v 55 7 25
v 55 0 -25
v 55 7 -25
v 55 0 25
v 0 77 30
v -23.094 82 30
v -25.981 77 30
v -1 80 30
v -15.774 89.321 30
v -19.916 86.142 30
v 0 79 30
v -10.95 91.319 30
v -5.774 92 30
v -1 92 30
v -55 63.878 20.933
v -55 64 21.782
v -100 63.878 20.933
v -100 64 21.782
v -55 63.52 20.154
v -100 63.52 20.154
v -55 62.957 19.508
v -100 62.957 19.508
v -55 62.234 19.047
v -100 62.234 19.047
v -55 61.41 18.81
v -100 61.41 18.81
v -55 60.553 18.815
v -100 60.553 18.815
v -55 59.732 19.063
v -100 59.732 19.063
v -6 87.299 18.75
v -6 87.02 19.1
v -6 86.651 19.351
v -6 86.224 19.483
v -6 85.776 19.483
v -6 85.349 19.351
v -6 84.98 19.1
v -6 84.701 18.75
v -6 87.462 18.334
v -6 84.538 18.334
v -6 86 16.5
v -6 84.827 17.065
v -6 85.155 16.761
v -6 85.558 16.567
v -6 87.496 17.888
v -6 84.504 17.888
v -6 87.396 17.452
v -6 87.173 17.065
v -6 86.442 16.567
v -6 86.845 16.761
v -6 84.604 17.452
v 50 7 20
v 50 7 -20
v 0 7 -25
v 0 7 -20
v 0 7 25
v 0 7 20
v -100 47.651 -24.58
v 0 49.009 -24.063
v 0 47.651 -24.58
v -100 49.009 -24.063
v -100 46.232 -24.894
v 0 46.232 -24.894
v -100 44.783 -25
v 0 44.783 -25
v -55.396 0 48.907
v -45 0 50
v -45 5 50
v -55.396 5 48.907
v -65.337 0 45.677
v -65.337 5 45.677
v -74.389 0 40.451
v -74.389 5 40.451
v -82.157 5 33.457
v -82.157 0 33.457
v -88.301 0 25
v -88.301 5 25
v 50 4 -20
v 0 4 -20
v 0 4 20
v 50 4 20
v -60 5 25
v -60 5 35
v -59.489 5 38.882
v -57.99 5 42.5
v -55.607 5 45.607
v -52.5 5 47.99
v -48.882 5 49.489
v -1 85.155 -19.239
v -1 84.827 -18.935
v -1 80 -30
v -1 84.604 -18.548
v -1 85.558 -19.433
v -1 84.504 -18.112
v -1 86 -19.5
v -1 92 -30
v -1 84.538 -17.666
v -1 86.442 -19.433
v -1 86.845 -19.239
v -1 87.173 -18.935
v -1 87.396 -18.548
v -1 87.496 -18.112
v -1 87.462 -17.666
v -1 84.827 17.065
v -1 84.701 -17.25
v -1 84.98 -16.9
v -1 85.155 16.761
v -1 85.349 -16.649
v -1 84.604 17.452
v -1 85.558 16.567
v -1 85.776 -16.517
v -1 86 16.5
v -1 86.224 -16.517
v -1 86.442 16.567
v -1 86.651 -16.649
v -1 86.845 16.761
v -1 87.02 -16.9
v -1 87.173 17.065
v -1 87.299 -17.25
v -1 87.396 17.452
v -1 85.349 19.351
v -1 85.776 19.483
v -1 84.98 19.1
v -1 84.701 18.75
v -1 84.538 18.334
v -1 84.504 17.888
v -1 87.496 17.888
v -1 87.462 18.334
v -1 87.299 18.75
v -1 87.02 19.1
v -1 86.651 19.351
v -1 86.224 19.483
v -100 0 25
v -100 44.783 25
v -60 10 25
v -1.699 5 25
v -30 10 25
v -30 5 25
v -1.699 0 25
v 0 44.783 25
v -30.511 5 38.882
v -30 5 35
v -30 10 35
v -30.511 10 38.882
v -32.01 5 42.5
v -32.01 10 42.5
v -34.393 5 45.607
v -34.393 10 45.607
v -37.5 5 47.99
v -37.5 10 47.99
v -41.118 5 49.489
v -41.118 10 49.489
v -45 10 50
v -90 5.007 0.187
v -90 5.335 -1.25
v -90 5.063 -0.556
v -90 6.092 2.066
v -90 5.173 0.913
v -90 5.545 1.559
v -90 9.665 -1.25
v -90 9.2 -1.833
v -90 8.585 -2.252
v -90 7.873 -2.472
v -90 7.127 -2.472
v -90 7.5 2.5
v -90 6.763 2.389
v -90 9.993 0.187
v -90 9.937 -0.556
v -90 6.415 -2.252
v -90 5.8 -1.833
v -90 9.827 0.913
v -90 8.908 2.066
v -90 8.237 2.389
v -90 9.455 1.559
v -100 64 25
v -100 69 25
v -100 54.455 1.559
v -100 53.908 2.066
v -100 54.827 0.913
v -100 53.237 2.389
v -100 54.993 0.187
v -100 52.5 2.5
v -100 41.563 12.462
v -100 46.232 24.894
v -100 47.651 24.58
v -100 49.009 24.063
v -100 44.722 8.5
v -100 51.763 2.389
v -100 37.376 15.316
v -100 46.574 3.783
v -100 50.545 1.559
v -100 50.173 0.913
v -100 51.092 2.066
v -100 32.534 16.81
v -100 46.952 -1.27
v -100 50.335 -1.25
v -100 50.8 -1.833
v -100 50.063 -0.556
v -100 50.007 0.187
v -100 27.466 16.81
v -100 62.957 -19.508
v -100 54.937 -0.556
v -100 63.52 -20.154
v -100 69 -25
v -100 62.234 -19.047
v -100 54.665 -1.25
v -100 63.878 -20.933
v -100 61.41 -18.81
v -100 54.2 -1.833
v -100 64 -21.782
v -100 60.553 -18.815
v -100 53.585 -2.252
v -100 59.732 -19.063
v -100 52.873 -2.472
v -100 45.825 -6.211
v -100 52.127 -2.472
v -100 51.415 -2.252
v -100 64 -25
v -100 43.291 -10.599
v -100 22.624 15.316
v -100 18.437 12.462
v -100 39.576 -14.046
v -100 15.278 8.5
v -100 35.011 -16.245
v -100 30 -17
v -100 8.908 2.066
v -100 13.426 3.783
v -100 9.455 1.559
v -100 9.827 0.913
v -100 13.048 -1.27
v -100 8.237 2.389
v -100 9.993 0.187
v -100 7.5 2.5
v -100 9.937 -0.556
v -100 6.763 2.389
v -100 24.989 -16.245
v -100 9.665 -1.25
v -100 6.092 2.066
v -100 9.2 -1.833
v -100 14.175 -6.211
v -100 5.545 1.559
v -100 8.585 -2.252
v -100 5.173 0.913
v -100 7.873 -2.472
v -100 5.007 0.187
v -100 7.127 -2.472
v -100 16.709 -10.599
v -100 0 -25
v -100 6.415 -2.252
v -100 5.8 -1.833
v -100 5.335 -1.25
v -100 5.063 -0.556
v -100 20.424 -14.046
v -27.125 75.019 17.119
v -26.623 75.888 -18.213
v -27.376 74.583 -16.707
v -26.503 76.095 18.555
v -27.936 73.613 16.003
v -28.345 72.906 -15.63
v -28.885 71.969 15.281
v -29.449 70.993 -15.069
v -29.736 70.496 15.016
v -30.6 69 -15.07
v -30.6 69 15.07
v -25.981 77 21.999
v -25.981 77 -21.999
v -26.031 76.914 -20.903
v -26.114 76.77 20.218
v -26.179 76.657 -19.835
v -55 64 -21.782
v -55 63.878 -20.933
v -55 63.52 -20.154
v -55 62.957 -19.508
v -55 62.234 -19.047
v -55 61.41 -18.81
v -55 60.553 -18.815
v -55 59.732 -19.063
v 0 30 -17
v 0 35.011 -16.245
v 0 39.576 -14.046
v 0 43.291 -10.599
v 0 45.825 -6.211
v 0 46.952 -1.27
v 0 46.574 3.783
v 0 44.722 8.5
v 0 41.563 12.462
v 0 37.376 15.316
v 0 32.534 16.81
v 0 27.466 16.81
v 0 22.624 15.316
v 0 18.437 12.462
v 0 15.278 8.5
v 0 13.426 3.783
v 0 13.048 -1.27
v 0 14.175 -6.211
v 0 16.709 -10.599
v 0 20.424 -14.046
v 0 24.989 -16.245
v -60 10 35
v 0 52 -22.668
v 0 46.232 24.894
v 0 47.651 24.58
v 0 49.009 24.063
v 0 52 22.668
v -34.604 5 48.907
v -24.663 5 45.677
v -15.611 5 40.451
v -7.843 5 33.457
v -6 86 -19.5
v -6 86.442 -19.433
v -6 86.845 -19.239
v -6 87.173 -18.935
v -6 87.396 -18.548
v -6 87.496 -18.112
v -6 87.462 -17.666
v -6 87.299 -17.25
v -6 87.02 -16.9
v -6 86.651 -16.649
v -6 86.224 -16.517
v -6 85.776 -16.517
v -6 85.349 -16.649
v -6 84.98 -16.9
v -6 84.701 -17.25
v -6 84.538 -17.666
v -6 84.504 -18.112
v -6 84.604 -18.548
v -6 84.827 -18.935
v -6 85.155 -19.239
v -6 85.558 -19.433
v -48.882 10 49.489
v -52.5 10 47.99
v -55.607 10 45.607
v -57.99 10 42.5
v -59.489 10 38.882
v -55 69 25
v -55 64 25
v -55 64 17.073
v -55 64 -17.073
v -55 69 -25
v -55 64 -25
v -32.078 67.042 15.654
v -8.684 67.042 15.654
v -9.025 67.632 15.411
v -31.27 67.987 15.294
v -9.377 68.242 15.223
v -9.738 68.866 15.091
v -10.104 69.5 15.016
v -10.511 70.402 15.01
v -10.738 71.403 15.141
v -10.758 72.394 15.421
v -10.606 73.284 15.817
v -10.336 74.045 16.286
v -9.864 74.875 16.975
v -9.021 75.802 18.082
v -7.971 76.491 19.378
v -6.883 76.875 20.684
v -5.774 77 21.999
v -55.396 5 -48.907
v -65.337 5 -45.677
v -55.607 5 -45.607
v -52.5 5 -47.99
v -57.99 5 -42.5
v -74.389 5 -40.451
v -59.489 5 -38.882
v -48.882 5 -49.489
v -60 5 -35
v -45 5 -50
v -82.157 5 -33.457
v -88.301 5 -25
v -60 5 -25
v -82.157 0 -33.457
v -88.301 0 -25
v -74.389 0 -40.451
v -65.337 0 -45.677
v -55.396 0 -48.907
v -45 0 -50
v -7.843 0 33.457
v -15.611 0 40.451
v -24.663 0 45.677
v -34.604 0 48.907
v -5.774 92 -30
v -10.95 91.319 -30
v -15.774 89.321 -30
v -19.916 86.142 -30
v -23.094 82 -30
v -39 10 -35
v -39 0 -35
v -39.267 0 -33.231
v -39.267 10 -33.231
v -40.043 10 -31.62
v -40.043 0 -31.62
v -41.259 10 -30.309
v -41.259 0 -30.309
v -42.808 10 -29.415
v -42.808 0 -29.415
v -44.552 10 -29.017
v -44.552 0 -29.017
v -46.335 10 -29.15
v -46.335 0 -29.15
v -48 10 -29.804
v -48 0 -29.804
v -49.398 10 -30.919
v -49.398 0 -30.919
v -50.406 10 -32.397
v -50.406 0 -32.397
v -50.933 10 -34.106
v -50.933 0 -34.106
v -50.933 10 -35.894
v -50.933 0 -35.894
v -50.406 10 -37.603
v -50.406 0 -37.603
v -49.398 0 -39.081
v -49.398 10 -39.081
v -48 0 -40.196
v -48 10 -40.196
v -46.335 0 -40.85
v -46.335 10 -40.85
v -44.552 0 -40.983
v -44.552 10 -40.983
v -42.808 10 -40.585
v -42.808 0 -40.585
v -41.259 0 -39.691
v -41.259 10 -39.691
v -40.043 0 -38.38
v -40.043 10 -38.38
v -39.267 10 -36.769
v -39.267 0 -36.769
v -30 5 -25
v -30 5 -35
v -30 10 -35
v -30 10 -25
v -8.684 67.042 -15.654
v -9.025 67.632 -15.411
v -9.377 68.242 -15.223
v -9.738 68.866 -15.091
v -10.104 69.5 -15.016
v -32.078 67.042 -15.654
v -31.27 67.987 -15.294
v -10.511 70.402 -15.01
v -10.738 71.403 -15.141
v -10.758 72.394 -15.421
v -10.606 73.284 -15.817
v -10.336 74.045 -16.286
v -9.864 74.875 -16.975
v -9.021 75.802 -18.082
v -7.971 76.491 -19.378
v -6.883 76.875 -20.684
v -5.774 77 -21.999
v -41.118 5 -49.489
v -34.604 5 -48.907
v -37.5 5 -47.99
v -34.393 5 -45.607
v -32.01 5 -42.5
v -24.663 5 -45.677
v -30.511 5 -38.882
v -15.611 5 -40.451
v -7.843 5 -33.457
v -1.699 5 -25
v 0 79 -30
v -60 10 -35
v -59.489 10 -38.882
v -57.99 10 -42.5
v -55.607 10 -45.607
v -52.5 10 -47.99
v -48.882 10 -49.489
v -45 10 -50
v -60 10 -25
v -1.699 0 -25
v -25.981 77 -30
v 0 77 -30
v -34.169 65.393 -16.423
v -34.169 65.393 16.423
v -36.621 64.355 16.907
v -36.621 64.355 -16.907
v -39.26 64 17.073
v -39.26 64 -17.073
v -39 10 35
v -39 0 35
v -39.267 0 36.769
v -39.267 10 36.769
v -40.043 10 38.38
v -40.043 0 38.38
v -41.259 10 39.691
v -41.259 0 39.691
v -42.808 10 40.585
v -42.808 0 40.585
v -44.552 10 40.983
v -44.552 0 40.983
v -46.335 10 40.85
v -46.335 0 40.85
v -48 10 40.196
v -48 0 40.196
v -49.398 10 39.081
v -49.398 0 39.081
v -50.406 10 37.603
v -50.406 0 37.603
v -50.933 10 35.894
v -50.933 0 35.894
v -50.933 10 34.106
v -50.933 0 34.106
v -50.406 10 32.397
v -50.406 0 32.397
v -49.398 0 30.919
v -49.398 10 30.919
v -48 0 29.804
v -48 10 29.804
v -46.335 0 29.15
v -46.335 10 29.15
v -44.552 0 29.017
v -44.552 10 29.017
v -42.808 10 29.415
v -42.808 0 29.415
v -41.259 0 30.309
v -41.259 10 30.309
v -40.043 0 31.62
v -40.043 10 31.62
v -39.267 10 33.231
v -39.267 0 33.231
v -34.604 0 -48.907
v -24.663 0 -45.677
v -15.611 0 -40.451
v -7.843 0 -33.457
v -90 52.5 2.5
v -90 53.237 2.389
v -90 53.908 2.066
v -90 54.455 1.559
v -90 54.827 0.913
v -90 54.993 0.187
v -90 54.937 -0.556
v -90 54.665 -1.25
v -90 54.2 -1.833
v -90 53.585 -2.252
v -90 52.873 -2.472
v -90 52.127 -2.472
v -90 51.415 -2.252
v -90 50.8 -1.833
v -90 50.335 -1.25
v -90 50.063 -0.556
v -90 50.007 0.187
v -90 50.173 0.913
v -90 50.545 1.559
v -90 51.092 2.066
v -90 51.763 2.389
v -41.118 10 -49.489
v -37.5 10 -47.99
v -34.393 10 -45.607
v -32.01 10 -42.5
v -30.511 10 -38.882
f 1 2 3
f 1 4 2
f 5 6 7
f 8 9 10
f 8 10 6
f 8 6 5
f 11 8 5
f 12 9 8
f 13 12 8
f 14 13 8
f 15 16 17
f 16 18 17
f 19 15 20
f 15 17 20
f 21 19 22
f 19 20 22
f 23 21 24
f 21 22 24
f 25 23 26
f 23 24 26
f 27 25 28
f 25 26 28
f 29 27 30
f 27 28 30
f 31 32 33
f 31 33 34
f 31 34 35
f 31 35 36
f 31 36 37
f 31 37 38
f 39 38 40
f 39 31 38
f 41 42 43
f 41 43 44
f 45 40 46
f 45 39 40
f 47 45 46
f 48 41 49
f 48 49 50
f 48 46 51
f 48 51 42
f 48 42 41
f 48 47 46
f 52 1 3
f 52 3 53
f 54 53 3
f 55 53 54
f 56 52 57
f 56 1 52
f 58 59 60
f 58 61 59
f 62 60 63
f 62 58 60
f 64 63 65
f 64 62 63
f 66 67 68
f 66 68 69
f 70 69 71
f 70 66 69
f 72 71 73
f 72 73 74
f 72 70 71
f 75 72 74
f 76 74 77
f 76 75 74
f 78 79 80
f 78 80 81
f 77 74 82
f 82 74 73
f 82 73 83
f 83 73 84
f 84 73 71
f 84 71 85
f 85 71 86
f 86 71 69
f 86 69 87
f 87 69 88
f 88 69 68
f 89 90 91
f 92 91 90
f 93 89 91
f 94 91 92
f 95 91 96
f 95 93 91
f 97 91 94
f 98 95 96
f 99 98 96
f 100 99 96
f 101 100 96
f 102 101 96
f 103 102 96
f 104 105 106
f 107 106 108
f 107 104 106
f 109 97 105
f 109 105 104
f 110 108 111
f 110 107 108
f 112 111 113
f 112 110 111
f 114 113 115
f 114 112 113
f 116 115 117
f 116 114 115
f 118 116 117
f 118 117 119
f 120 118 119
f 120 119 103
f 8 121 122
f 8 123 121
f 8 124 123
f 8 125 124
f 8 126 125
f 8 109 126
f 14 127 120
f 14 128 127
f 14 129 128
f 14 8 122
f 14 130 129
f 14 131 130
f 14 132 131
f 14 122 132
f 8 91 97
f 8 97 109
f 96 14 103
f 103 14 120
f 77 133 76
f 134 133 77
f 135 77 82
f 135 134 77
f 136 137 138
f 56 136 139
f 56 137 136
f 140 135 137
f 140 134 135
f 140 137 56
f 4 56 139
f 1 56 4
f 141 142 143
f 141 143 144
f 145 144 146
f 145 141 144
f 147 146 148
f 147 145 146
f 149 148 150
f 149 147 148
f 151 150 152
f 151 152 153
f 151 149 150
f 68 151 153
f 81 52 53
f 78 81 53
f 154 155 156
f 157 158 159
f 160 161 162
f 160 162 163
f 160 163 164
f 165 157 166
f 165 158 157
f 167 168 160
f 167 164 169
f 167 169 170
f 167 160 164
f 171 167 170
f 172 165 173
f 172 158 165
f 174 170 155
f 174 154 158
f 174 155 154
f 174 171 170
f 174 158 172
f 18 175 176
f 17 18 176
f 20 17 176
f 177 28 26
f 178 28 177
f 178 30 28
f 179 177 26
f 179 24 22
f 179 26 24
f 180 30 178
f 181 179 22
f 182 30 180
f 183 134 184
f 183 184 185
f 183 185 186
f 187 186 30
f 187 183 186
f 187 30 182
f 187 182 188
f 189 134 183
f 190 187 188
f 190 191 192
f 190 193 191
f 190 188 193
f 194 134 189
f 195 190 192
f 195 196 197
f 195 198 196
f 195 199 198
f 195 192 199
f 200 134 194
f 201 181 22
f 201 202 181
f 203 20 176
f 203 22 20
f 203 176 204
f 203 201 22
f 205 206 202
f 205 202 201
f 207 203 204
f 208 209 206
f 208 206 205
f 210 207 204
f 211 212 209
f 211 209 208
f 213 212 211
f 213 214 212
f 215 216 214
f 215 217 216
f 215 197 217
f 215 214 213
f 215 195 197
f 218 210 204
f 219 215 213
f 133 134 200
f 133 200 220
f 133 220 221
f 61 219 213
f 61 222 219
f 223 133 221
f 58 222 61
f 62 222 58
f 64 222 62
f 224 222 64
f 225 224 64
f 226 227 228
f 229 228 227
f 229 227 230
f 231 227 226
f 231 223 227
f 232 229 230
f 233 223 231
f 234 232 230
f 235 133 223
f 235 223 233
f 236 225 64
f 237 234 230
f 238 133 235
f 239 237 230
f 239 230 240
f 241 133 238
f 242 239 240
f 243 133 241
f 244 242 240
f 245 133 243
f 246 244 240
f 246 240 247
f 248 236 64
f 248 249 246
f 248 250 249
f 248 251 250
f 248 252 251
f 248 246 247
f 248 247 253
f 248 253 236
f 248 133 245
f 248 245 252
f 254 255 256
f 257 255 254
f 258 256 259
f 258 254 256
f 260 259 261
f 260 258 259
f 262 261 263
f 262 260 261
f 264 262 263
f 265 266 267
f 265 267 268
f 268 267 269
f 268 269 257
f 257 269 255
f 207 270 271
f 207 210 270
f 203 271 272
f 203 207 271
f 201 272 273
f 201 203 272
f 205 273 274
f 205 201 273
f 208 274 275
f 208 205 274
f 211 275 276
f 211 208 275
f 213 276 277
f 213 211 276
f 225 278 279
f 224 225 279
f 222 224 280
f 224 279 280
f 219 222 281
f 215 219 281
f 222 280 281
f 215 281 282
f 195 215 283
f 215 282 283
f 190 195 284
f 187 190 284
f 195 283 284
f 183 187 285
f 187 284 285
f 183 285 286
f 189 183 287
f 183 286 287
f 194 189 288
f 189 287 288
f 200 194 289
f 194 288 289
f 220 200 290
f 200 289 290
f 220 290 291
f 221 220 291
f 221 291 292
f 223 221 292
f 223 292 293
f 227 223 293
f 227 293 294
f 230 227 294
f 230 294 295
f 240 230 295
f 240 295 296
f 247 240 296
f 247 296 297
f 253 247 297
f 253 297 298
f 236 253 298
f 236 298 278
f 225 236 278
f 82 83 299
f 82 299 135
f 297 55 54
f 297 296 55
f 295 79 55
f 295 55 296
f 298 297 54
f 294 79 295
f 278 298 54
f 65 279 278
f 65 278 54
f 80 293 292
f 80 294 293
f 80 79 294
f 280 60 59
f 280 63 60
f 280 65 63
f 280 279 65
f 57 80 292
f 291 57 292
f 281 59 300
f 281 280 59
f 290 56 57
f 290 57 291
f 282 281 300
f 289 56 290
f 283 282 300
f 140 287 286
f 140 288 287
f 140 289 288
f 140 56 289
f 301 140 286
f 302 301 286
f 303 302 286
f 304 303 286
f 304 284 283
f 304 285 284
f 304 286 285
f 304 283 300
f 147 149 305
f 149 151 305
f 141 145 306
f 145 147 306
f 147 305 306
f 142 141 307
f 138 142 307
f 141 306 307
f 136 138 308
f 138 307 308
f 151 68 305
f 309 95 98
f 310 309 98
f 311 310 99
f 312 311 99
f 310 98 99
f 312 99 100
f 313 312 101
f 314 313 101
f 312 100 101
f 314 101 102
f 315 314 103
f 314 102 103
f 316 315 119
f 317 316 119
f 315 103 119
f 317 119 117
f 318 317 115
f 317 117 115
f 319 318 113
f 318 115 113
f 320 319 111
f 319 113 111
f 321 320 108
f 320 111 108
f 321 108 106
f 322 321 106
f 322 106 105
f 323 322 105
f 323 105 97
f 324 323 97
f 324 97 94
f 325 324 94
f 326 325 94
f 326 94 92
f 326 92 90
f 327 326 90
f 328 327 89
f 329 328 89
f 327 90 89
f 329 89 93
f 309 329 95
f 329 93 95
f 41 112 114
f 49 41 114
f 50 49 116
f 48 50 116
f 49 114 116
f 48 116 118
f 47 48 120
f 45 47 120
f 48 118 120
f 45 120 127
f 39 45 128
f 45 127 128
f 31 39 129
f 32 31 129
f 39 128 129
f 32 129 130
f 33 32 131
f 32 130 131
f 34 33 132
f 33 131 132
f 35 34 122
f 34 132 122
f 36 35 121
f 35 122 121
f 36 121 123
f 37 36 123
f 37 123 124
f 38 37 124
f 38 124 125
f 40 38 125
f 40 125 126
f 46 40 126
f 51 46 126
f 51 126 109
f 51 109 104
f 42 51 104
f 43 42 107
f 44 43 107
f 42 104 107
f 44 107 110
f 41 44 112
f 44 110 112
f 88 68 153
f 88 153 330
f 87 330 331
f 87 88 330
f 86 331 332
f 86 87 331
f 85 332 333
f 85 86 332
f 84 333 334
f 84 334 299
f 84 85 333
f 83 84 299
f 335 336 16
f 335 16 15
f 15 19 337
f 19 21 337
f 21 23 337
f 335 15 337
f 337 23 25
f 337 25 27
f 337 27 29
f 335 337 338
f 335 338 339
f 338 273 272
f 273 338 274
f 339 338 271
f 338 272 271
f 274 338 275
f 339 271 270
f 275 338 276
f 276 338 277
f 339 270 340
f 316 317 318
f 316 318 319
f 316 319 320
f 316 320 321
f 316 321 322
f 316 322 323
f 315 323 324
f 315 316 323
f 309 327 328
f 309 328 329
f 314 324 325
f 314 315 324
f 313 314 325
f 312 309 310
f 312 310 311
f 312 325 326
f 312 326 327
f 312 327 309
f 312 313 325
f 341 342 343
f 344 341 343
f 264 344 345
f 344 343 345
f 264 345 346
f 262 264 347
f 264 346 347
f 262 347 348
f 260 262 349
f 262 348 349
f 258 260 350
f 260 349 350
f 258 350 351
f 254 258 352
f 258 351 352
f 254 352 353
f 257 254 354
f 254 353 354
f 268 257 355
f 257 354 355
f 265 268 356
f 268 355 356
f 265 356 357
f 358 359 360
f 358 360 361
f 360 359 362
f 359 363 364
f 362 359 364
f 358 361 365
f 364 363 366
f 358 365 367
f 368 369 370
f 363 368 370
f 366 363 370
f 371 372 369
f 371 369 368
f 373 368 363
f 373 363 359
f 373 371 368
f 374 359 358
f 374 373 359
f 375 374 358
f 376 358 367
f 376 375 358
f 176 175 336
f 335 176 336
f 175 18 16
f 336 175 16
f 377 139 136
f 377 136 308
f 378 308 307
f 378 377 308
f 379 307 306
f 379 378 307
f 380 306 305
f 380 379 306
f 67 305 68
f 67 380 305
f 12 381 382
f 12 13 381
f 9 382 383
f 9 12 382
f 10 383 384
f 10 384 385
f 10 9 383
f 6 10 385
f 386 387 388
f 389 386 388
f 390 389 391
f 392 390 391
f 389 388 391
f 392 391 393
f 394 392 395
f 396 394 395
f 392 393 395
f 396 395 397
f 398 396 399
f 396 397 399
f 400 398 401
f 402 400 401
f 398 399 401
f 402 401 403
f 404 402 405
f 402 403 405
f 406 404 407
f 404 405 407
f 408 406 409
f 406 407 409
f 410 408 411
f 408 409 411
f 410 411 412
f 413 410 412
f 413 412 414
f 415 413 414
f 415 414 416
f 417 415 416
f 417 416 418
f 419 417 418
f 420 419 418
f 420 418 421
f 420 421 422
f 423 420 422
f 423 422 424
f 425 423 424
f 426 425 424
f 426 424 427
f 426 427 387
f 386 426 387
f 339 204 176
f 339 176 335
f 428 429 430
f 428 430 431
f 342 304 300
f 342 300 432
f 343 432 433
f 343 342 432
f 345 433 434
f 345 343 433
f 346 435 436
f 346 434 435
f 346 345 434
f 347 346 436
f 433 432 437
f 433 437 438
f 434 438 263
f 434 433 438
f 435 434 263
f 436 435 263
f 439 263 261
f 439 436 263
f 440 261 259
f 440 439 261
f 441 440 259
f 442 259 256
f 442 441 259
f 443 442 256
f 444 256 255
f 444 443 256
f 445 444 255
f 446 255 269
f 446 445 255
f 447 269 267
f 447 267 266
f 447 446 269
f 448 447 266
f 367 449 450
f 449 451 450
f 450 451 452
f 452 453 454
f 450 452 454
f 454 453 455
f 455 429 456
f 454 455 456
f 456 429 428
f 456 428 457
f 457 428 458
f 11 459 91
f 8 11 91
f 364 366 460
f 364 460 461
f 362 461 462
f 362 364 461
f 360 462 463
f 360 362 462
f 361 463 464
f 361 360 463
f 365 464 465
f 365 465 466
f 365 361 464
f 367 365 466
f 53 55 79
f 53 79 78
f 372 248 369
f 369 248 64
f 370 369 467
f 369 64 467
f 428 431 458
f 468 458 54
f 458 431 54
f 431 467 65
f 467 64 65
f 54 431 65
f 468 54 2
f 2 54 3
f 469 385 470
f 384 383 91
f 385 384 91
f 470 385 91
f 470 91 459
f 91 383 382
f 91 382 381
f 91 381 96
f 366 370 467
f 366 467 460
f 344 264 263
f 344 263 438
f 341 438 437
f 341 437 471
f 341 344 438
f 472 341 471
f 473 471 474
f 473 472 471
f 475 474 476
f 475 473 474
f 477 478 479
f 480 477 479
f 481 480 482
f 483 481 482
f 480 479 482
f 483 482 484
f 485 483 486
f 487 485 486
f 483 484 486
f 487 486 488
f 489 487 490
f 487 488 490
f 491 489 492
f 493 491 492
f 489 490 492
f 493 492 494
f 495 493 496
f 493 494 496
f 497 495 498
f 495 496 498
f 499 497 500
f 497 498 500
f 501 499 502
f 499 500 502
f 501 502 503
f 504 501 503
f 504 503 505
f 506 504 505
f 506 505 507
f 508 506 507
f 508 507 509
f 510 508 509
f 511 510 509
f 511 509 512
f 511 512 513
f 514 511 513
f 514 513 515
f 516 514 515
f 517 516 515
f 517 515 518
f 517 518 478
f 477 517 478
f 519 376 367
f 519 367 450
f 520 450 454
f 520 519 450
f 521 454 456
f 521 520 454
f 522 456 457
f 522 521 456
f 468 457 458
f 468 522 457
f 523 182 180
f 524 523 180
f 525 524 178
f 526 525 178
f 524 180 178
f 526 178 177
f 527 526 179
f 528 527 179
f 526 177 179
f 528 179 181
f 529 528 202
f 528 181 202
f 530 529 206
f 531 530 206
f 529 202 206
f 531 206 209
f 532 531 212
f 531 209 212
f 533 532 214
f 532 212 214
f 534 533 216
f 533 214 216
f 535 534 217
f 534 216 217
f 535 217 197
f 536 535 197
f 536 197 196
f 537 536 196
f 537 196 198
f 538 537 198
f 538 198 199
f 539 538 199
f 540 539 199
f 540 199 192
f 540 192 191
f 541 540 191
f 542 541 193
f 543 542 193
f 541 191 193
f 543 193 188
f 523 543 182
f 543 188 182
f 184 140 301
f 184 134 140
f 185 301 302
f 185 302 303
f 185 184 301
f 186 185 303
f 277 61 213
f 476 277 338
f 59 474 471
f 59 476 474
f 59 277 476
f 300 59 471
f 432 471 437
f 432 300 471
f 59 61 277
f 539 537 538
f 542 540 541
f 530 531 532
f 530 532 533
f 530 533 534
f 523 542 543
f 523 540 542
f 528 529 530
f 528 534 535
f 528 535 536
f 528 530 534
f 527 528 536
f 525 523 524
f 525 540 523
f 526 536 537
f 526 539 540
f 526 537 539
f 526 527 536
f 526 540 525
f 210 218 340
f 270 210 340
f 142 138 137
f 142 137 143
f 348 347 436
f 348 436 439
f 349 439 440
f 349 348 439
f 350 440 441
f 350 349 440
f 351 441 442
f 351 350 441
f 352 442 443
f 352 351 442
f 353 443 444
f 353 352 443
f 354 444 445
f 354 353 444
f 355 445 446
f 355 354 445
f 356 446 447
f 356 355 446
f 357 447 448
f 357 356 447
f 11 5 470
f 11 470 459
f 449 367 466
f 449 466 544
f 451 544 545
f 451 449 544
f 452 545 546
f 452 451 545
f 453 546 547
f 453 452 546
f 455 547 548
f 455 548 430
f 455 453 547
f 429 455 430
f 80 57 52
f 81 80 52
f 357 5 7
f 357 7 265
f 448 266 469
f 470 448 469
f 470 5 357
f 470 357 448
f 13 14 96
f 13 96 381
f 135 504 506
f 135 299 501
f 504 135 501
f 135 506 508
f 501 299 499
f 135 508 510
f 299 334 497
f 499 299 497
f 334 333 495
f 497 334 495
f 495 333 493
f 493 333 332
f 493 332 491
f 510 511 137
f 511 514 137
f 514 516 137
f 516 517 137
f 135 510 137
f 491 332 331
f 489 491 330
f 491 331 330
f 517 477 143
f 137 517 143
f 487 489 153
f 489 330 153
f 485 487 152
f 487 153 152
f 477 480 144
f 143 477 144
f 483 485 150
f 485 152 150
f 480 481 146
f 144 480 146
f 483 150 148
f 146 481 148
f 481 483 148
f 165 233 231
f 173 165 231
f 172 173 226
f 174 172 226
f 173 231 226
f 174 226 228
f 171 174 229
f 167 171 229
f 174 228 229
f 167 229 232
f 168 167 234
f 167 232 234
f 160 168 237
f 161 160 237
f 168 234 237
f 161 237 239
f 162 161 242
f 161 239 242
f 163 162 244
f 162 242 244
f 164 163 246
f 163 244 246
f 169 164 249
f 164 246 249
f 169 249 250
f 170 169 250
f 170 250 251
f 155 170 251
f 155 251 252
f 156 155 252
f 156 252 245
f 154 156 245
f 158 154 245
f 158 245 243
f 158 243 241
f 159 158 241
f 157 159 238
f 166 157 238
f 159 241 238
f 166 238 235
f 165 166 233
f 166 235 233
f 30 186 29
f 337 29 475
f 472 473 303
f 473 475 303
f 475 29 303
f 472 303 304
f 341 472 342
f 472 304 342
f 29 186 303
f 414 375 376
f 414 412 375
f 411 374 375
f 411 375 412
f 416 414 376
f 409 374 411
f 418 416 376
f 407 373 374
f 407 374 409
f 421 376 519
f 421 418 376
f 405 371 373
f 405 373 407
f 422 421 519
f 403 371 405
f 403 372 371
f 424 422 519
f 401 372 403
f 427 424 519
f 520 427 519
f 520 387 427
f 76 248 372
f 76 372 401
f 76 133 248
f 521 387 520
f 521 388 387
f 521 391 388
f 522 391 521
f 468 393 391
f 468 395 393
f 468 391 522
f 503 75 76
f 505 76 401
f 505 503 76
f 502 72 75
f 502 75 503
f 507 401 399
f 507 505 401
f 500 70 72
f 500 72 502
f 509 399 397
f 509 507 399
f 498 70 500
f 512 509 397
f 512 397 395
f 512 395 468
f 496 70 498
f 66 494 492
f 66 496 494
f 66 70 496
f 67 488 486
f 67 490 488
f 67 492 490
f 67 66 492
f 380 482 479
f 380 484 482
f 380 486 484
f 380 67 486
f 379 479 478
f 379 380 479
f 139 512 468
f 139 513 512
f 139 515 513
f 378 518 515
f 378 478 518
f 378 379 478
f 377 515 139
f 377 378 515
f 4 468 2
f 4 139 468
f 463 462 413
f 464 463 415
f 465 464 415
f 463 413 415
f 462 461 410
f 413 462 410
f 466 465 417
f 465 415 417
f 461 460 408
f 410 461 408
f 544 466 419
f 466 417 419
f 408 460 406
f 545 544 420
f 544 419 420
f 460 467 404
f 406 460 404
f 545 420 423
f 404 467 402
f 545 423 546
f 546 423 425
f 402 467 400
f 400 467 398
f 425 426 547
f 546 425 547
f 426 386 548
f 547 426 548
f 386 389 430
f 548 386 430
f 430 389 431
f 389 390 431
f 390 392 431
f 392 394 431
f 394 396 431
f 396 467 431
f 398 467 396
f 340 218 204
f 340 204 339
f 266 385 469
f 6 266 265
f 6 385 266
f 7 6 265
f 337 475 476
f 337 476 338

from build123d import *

# Parameters (mm, degrees)
BOSS_EXTRUDE1_DEPTH = 25
SKETCH3_W           = 50
SKETCH3_H           = 40
CUT_EXTRUDE1_DEPTH  = 3
BOSS_EXTRUDE5_DEPTH = 30
SKETCH4_R           = 1.5
CUT_EXTRUDE2_DEPTH  = 5
SKETCH5_R           = 17
CUT_EXTRUDE3_DEPTH  = 140.154590294
SKETCH6_R           = 2.5
CUT_EXTRUDE4_DEPTH  = 10
SKETCH8_R           = 6
BOSS_EXTRUDE2_DEPTH = 5
SKETCH8_3_R         = 6
BOSS_EXTRUDE3_DEPTH = 10
CUT_EXTRUDE5_DEPTH  = 145.789502382
SKETCH10_W          = 45
SKETCH10_H          = 50
BOSS_EXTRUDE4_DEPTH = 5
FILLET1_R           = 3
FILLET2_R           = 10


with BuildPart() as part:
    # Sketch2 → Boss-Extrude1 (new, symmetric)
    with BuildSketch(Plane.XY):
        with BuildLine():
            Line((55, 7), (0, 7))
            Line((0, 7), (0, 52))
            Line((0, 52), (-10.103629711, 69.5))
            ThreePointArc((-10.103629711, 69.5), (-10.103629711, 74.5), (-5.773502692, 77))
            Line((-5.773502692, 77), (0, 77))
            Line((0, 77), (0, 79))
            Line((0, 79), (-1, 80))
            Line((-1, 80), (-1, 92))
            Line((-1, 92), (-5.773502692, 92))
            ThreePointArc((-5.773502692, 92), (-15.773502692, 89.320508076), (-23.094010768, 82))
            Line((-23.094010768, 82), (-30.599564267, 69))
            ThreePointArc((-30.599564267, 69), (-34.259818305, 65.339745962), (-39.259818305, 64))
            Line((-39.259818305, 64), (-100, 64))
            Line((-100, 64), (-100, 0))
            Line((-100, 0), (55, 0))
            Line((55, 0), (55, 7))
        make_face()
    extrude(amount=BOSS_EXTRUDE1_DEPTH, both=True)

    # Sketch3 → Cut-Extrude1 (cut)
    with BuildSketch(Plane(origin=(0, 7, 0), x_dir=(1, 0, 0), z_dir=(0, 1, 0))):
        with Locations((25, 0)):
            Rectangle(SKETCH3_W, SKETCH3_H)
    extrude(amount=-CUT_EXTRUDE1_DEPTH, mode=Mode.SUBTRACT)

    # Sketch2<4> → Boss-Extrude5 (add, symmetric)
    with BuildSketch(Plane.XY):
        with BuildLine():
            Line((-25.980762114, 77), (-5.773502692, 77))
            Line((-5.773502692, 77), (0, 77))
            Line((0, 77), (0, 79))
            Line((0, 79), (-1, 80))
            Line((-1, 80), (-1, 92))
            Line((-1, 92), (-5.773502692, 92))
            ThreePointArc((-5.773502692, 92), (-15.773502692, 89.320508076), (-23.094010768, 82))
            Line((-23.094010768, 82), (-25.980762114, 77))
        make_face()
    extrude(amount=BOSS_EXTRUDE5_DEPTH, both=True)

    # Sketch4 → Cut-Extrude2 (cut)
    with BuildSketch(Plane(origin=(-1, 0, 0), x_dir=(0, 0, -1), z_dir=(1, 0, 0))):
        with Locations((-18, 86)):
            Circle(SKETCH4_R)
        with Locations((18, 86)):
            Circle(SKETCH4_R)
    extrude(amount=-CUT_EXTRUDE2_DEPTH, mode=Mode.SUBTRACT)

    # Sketch5 → Cut-Extrude3 (cut, through all)
    with BuildSketch(Plane(origin=(0, 0, 0), x_dir=(0, 0, -1), z_dir=(1, 0, 0))):
        with Locations((0, 30)):
            Circle(SKETCH5_R)
    extrude(amount=-CUT_EXTRUDE3_DEPTH, mode=Mode.SUBTRACT)

    # Sketch6 → Cut-Extrude4 (cut)
    with BuildSketch(Plane.ZY.offset(100)):
        with Locations((0, 52.5)):
            Circle(SKETCH6_R)
        with Locations((0, 7.5)):
            Circle(SKETCH6_R)
    extrude(amount=-CUT_EXTRUDE4_DEPTH, mode=Mode.SUBTRACT)

    # Sketch8 → Boss-Extrude2 (add)
    # profile 1 of 2: a face of its own
    with BuildSketch(Plane.XZ):
        with BuildLine():
            Line((-88.301270189, 25), (-1.698729811, 25))
            ThreePointArc((-1.698729811, 25), (-45, 50), (-88.301270189, 25))
        make_face()
        with Locations((-45, 35)):
            Circle(SKETCH8_R, mode=Mode.SUBTRACT)
    # profile 2 of 2: a face of its own
    with BuildSketch(Plane.XZ):
        with BuildLine():
            ThreePointArc((-88.301270189, -25), (-45, -50), (-1.698729811, -25))
            Line((-1.698729811, -25), (-88.301270189, -25))
        make_face()
        with Locations((-45, -35)):
            Circle(SKETCH8_R, mode=Mode.SUBTRACT)
    extrude(amount=-BOSS_EXTRUDE2_DEPTH)

    # Sketch8<3> → Boss-Extrude3 (add)
    # profile 1 of 2: a face of its own
    with BuildSketch(Plane.XZ):
        with BuildLine():
            Line((-60, 35), (-60, 25))
            Line((-60, 25), (-30, 25))
            Line((-30, 25), (-30, 35))
            ThreePointArc((-30, 35), (-45, 50), (-60, 35))
        make_face()
        with Locations((-45, 35)):
            Circle(SKETCH8_3_R, mode=Mode.SUBTRACT)
    # profile 2 of 2: a face of its own
    with BuildSketch(Plane.XZ):
        with BuildLine():
            Line((-30, -25), (-60, -25))
            Line((-60, -25), (-60, -35))
            ThreePointArc((-60, -35), (-45, -50), (-30, -35))
            Line((-30, -35), (-30, -25))
        make_face()
        with Locations((-45, -35)):
            Circle(SKETCH8_3_R, mode=Mode.SUBTRACT)
    extrude(amount=-BOSS_EXTRUDE3_DEPTH)

    # Sketch12 → Cut-Extrude5 (cut, through all)
    with BuildSketch(Plane(origin=(0, 0, 0), x_dir=(0, 0, -1), z_dir=(1, 0, 0))):
        with BuildLine():
            Line((25, 47), (15.654414786, 67.041672168))
            ThreePointArc((15.654414786, 67.041672168), (16.094829174, 73.761097258), (21.998569295, 77))
            Line((21.998569295, 77), (25, 77))
            Line((25, 77), (25, 47))
        make_face()
        with BuildLine():
            Line((-25, 77), (-25, 47))
            Line((-25, 47), (-15.654414786, 67.041672168))
            ThreePointArc((-15.654414786, 67.041672168), (-16.094829174, 73.761097258), (-21.998569295, 77))
            Line((-21.998569295, 77), (-25, 77))
        make_face()
    extrude(amount=-CUT_EXTRUDE5_DEPTH, mode=Mode.SUBTRACT)

    # Sketch10 → Boss-Extrude4 (add)
    with BuildSketch(Plane(origin=(0, 64, 0), x_dir=(1, 0, 0), z_dir=(0, 1, 0))):
        with Locations((-77.5, 0)):
            Rectangle(SKETCH10_W, SKETCH10_H)
    extrude(amount=BOSS_EXTRUDE4_DEPTH)

    # Fillet1
    fillet1_edges = [part.edges().sort_by_distance(p)[0] for p in [
        (-77.5, 64, -17.072769811),
        (-77.5, 64, 17.072769811),
    ]]
    fillet(fillet1_edges, radius=FILLET1_R)

    # Fillet2
    fillet2_edges = [part.edges().sort_by_distance(p)[0] for p in [
        (-50, 47, -25),
        (-50, 47, 25),
    ]]
    fillet(fillet2_edges, radius=FILLET2_R)


solid = part.part
